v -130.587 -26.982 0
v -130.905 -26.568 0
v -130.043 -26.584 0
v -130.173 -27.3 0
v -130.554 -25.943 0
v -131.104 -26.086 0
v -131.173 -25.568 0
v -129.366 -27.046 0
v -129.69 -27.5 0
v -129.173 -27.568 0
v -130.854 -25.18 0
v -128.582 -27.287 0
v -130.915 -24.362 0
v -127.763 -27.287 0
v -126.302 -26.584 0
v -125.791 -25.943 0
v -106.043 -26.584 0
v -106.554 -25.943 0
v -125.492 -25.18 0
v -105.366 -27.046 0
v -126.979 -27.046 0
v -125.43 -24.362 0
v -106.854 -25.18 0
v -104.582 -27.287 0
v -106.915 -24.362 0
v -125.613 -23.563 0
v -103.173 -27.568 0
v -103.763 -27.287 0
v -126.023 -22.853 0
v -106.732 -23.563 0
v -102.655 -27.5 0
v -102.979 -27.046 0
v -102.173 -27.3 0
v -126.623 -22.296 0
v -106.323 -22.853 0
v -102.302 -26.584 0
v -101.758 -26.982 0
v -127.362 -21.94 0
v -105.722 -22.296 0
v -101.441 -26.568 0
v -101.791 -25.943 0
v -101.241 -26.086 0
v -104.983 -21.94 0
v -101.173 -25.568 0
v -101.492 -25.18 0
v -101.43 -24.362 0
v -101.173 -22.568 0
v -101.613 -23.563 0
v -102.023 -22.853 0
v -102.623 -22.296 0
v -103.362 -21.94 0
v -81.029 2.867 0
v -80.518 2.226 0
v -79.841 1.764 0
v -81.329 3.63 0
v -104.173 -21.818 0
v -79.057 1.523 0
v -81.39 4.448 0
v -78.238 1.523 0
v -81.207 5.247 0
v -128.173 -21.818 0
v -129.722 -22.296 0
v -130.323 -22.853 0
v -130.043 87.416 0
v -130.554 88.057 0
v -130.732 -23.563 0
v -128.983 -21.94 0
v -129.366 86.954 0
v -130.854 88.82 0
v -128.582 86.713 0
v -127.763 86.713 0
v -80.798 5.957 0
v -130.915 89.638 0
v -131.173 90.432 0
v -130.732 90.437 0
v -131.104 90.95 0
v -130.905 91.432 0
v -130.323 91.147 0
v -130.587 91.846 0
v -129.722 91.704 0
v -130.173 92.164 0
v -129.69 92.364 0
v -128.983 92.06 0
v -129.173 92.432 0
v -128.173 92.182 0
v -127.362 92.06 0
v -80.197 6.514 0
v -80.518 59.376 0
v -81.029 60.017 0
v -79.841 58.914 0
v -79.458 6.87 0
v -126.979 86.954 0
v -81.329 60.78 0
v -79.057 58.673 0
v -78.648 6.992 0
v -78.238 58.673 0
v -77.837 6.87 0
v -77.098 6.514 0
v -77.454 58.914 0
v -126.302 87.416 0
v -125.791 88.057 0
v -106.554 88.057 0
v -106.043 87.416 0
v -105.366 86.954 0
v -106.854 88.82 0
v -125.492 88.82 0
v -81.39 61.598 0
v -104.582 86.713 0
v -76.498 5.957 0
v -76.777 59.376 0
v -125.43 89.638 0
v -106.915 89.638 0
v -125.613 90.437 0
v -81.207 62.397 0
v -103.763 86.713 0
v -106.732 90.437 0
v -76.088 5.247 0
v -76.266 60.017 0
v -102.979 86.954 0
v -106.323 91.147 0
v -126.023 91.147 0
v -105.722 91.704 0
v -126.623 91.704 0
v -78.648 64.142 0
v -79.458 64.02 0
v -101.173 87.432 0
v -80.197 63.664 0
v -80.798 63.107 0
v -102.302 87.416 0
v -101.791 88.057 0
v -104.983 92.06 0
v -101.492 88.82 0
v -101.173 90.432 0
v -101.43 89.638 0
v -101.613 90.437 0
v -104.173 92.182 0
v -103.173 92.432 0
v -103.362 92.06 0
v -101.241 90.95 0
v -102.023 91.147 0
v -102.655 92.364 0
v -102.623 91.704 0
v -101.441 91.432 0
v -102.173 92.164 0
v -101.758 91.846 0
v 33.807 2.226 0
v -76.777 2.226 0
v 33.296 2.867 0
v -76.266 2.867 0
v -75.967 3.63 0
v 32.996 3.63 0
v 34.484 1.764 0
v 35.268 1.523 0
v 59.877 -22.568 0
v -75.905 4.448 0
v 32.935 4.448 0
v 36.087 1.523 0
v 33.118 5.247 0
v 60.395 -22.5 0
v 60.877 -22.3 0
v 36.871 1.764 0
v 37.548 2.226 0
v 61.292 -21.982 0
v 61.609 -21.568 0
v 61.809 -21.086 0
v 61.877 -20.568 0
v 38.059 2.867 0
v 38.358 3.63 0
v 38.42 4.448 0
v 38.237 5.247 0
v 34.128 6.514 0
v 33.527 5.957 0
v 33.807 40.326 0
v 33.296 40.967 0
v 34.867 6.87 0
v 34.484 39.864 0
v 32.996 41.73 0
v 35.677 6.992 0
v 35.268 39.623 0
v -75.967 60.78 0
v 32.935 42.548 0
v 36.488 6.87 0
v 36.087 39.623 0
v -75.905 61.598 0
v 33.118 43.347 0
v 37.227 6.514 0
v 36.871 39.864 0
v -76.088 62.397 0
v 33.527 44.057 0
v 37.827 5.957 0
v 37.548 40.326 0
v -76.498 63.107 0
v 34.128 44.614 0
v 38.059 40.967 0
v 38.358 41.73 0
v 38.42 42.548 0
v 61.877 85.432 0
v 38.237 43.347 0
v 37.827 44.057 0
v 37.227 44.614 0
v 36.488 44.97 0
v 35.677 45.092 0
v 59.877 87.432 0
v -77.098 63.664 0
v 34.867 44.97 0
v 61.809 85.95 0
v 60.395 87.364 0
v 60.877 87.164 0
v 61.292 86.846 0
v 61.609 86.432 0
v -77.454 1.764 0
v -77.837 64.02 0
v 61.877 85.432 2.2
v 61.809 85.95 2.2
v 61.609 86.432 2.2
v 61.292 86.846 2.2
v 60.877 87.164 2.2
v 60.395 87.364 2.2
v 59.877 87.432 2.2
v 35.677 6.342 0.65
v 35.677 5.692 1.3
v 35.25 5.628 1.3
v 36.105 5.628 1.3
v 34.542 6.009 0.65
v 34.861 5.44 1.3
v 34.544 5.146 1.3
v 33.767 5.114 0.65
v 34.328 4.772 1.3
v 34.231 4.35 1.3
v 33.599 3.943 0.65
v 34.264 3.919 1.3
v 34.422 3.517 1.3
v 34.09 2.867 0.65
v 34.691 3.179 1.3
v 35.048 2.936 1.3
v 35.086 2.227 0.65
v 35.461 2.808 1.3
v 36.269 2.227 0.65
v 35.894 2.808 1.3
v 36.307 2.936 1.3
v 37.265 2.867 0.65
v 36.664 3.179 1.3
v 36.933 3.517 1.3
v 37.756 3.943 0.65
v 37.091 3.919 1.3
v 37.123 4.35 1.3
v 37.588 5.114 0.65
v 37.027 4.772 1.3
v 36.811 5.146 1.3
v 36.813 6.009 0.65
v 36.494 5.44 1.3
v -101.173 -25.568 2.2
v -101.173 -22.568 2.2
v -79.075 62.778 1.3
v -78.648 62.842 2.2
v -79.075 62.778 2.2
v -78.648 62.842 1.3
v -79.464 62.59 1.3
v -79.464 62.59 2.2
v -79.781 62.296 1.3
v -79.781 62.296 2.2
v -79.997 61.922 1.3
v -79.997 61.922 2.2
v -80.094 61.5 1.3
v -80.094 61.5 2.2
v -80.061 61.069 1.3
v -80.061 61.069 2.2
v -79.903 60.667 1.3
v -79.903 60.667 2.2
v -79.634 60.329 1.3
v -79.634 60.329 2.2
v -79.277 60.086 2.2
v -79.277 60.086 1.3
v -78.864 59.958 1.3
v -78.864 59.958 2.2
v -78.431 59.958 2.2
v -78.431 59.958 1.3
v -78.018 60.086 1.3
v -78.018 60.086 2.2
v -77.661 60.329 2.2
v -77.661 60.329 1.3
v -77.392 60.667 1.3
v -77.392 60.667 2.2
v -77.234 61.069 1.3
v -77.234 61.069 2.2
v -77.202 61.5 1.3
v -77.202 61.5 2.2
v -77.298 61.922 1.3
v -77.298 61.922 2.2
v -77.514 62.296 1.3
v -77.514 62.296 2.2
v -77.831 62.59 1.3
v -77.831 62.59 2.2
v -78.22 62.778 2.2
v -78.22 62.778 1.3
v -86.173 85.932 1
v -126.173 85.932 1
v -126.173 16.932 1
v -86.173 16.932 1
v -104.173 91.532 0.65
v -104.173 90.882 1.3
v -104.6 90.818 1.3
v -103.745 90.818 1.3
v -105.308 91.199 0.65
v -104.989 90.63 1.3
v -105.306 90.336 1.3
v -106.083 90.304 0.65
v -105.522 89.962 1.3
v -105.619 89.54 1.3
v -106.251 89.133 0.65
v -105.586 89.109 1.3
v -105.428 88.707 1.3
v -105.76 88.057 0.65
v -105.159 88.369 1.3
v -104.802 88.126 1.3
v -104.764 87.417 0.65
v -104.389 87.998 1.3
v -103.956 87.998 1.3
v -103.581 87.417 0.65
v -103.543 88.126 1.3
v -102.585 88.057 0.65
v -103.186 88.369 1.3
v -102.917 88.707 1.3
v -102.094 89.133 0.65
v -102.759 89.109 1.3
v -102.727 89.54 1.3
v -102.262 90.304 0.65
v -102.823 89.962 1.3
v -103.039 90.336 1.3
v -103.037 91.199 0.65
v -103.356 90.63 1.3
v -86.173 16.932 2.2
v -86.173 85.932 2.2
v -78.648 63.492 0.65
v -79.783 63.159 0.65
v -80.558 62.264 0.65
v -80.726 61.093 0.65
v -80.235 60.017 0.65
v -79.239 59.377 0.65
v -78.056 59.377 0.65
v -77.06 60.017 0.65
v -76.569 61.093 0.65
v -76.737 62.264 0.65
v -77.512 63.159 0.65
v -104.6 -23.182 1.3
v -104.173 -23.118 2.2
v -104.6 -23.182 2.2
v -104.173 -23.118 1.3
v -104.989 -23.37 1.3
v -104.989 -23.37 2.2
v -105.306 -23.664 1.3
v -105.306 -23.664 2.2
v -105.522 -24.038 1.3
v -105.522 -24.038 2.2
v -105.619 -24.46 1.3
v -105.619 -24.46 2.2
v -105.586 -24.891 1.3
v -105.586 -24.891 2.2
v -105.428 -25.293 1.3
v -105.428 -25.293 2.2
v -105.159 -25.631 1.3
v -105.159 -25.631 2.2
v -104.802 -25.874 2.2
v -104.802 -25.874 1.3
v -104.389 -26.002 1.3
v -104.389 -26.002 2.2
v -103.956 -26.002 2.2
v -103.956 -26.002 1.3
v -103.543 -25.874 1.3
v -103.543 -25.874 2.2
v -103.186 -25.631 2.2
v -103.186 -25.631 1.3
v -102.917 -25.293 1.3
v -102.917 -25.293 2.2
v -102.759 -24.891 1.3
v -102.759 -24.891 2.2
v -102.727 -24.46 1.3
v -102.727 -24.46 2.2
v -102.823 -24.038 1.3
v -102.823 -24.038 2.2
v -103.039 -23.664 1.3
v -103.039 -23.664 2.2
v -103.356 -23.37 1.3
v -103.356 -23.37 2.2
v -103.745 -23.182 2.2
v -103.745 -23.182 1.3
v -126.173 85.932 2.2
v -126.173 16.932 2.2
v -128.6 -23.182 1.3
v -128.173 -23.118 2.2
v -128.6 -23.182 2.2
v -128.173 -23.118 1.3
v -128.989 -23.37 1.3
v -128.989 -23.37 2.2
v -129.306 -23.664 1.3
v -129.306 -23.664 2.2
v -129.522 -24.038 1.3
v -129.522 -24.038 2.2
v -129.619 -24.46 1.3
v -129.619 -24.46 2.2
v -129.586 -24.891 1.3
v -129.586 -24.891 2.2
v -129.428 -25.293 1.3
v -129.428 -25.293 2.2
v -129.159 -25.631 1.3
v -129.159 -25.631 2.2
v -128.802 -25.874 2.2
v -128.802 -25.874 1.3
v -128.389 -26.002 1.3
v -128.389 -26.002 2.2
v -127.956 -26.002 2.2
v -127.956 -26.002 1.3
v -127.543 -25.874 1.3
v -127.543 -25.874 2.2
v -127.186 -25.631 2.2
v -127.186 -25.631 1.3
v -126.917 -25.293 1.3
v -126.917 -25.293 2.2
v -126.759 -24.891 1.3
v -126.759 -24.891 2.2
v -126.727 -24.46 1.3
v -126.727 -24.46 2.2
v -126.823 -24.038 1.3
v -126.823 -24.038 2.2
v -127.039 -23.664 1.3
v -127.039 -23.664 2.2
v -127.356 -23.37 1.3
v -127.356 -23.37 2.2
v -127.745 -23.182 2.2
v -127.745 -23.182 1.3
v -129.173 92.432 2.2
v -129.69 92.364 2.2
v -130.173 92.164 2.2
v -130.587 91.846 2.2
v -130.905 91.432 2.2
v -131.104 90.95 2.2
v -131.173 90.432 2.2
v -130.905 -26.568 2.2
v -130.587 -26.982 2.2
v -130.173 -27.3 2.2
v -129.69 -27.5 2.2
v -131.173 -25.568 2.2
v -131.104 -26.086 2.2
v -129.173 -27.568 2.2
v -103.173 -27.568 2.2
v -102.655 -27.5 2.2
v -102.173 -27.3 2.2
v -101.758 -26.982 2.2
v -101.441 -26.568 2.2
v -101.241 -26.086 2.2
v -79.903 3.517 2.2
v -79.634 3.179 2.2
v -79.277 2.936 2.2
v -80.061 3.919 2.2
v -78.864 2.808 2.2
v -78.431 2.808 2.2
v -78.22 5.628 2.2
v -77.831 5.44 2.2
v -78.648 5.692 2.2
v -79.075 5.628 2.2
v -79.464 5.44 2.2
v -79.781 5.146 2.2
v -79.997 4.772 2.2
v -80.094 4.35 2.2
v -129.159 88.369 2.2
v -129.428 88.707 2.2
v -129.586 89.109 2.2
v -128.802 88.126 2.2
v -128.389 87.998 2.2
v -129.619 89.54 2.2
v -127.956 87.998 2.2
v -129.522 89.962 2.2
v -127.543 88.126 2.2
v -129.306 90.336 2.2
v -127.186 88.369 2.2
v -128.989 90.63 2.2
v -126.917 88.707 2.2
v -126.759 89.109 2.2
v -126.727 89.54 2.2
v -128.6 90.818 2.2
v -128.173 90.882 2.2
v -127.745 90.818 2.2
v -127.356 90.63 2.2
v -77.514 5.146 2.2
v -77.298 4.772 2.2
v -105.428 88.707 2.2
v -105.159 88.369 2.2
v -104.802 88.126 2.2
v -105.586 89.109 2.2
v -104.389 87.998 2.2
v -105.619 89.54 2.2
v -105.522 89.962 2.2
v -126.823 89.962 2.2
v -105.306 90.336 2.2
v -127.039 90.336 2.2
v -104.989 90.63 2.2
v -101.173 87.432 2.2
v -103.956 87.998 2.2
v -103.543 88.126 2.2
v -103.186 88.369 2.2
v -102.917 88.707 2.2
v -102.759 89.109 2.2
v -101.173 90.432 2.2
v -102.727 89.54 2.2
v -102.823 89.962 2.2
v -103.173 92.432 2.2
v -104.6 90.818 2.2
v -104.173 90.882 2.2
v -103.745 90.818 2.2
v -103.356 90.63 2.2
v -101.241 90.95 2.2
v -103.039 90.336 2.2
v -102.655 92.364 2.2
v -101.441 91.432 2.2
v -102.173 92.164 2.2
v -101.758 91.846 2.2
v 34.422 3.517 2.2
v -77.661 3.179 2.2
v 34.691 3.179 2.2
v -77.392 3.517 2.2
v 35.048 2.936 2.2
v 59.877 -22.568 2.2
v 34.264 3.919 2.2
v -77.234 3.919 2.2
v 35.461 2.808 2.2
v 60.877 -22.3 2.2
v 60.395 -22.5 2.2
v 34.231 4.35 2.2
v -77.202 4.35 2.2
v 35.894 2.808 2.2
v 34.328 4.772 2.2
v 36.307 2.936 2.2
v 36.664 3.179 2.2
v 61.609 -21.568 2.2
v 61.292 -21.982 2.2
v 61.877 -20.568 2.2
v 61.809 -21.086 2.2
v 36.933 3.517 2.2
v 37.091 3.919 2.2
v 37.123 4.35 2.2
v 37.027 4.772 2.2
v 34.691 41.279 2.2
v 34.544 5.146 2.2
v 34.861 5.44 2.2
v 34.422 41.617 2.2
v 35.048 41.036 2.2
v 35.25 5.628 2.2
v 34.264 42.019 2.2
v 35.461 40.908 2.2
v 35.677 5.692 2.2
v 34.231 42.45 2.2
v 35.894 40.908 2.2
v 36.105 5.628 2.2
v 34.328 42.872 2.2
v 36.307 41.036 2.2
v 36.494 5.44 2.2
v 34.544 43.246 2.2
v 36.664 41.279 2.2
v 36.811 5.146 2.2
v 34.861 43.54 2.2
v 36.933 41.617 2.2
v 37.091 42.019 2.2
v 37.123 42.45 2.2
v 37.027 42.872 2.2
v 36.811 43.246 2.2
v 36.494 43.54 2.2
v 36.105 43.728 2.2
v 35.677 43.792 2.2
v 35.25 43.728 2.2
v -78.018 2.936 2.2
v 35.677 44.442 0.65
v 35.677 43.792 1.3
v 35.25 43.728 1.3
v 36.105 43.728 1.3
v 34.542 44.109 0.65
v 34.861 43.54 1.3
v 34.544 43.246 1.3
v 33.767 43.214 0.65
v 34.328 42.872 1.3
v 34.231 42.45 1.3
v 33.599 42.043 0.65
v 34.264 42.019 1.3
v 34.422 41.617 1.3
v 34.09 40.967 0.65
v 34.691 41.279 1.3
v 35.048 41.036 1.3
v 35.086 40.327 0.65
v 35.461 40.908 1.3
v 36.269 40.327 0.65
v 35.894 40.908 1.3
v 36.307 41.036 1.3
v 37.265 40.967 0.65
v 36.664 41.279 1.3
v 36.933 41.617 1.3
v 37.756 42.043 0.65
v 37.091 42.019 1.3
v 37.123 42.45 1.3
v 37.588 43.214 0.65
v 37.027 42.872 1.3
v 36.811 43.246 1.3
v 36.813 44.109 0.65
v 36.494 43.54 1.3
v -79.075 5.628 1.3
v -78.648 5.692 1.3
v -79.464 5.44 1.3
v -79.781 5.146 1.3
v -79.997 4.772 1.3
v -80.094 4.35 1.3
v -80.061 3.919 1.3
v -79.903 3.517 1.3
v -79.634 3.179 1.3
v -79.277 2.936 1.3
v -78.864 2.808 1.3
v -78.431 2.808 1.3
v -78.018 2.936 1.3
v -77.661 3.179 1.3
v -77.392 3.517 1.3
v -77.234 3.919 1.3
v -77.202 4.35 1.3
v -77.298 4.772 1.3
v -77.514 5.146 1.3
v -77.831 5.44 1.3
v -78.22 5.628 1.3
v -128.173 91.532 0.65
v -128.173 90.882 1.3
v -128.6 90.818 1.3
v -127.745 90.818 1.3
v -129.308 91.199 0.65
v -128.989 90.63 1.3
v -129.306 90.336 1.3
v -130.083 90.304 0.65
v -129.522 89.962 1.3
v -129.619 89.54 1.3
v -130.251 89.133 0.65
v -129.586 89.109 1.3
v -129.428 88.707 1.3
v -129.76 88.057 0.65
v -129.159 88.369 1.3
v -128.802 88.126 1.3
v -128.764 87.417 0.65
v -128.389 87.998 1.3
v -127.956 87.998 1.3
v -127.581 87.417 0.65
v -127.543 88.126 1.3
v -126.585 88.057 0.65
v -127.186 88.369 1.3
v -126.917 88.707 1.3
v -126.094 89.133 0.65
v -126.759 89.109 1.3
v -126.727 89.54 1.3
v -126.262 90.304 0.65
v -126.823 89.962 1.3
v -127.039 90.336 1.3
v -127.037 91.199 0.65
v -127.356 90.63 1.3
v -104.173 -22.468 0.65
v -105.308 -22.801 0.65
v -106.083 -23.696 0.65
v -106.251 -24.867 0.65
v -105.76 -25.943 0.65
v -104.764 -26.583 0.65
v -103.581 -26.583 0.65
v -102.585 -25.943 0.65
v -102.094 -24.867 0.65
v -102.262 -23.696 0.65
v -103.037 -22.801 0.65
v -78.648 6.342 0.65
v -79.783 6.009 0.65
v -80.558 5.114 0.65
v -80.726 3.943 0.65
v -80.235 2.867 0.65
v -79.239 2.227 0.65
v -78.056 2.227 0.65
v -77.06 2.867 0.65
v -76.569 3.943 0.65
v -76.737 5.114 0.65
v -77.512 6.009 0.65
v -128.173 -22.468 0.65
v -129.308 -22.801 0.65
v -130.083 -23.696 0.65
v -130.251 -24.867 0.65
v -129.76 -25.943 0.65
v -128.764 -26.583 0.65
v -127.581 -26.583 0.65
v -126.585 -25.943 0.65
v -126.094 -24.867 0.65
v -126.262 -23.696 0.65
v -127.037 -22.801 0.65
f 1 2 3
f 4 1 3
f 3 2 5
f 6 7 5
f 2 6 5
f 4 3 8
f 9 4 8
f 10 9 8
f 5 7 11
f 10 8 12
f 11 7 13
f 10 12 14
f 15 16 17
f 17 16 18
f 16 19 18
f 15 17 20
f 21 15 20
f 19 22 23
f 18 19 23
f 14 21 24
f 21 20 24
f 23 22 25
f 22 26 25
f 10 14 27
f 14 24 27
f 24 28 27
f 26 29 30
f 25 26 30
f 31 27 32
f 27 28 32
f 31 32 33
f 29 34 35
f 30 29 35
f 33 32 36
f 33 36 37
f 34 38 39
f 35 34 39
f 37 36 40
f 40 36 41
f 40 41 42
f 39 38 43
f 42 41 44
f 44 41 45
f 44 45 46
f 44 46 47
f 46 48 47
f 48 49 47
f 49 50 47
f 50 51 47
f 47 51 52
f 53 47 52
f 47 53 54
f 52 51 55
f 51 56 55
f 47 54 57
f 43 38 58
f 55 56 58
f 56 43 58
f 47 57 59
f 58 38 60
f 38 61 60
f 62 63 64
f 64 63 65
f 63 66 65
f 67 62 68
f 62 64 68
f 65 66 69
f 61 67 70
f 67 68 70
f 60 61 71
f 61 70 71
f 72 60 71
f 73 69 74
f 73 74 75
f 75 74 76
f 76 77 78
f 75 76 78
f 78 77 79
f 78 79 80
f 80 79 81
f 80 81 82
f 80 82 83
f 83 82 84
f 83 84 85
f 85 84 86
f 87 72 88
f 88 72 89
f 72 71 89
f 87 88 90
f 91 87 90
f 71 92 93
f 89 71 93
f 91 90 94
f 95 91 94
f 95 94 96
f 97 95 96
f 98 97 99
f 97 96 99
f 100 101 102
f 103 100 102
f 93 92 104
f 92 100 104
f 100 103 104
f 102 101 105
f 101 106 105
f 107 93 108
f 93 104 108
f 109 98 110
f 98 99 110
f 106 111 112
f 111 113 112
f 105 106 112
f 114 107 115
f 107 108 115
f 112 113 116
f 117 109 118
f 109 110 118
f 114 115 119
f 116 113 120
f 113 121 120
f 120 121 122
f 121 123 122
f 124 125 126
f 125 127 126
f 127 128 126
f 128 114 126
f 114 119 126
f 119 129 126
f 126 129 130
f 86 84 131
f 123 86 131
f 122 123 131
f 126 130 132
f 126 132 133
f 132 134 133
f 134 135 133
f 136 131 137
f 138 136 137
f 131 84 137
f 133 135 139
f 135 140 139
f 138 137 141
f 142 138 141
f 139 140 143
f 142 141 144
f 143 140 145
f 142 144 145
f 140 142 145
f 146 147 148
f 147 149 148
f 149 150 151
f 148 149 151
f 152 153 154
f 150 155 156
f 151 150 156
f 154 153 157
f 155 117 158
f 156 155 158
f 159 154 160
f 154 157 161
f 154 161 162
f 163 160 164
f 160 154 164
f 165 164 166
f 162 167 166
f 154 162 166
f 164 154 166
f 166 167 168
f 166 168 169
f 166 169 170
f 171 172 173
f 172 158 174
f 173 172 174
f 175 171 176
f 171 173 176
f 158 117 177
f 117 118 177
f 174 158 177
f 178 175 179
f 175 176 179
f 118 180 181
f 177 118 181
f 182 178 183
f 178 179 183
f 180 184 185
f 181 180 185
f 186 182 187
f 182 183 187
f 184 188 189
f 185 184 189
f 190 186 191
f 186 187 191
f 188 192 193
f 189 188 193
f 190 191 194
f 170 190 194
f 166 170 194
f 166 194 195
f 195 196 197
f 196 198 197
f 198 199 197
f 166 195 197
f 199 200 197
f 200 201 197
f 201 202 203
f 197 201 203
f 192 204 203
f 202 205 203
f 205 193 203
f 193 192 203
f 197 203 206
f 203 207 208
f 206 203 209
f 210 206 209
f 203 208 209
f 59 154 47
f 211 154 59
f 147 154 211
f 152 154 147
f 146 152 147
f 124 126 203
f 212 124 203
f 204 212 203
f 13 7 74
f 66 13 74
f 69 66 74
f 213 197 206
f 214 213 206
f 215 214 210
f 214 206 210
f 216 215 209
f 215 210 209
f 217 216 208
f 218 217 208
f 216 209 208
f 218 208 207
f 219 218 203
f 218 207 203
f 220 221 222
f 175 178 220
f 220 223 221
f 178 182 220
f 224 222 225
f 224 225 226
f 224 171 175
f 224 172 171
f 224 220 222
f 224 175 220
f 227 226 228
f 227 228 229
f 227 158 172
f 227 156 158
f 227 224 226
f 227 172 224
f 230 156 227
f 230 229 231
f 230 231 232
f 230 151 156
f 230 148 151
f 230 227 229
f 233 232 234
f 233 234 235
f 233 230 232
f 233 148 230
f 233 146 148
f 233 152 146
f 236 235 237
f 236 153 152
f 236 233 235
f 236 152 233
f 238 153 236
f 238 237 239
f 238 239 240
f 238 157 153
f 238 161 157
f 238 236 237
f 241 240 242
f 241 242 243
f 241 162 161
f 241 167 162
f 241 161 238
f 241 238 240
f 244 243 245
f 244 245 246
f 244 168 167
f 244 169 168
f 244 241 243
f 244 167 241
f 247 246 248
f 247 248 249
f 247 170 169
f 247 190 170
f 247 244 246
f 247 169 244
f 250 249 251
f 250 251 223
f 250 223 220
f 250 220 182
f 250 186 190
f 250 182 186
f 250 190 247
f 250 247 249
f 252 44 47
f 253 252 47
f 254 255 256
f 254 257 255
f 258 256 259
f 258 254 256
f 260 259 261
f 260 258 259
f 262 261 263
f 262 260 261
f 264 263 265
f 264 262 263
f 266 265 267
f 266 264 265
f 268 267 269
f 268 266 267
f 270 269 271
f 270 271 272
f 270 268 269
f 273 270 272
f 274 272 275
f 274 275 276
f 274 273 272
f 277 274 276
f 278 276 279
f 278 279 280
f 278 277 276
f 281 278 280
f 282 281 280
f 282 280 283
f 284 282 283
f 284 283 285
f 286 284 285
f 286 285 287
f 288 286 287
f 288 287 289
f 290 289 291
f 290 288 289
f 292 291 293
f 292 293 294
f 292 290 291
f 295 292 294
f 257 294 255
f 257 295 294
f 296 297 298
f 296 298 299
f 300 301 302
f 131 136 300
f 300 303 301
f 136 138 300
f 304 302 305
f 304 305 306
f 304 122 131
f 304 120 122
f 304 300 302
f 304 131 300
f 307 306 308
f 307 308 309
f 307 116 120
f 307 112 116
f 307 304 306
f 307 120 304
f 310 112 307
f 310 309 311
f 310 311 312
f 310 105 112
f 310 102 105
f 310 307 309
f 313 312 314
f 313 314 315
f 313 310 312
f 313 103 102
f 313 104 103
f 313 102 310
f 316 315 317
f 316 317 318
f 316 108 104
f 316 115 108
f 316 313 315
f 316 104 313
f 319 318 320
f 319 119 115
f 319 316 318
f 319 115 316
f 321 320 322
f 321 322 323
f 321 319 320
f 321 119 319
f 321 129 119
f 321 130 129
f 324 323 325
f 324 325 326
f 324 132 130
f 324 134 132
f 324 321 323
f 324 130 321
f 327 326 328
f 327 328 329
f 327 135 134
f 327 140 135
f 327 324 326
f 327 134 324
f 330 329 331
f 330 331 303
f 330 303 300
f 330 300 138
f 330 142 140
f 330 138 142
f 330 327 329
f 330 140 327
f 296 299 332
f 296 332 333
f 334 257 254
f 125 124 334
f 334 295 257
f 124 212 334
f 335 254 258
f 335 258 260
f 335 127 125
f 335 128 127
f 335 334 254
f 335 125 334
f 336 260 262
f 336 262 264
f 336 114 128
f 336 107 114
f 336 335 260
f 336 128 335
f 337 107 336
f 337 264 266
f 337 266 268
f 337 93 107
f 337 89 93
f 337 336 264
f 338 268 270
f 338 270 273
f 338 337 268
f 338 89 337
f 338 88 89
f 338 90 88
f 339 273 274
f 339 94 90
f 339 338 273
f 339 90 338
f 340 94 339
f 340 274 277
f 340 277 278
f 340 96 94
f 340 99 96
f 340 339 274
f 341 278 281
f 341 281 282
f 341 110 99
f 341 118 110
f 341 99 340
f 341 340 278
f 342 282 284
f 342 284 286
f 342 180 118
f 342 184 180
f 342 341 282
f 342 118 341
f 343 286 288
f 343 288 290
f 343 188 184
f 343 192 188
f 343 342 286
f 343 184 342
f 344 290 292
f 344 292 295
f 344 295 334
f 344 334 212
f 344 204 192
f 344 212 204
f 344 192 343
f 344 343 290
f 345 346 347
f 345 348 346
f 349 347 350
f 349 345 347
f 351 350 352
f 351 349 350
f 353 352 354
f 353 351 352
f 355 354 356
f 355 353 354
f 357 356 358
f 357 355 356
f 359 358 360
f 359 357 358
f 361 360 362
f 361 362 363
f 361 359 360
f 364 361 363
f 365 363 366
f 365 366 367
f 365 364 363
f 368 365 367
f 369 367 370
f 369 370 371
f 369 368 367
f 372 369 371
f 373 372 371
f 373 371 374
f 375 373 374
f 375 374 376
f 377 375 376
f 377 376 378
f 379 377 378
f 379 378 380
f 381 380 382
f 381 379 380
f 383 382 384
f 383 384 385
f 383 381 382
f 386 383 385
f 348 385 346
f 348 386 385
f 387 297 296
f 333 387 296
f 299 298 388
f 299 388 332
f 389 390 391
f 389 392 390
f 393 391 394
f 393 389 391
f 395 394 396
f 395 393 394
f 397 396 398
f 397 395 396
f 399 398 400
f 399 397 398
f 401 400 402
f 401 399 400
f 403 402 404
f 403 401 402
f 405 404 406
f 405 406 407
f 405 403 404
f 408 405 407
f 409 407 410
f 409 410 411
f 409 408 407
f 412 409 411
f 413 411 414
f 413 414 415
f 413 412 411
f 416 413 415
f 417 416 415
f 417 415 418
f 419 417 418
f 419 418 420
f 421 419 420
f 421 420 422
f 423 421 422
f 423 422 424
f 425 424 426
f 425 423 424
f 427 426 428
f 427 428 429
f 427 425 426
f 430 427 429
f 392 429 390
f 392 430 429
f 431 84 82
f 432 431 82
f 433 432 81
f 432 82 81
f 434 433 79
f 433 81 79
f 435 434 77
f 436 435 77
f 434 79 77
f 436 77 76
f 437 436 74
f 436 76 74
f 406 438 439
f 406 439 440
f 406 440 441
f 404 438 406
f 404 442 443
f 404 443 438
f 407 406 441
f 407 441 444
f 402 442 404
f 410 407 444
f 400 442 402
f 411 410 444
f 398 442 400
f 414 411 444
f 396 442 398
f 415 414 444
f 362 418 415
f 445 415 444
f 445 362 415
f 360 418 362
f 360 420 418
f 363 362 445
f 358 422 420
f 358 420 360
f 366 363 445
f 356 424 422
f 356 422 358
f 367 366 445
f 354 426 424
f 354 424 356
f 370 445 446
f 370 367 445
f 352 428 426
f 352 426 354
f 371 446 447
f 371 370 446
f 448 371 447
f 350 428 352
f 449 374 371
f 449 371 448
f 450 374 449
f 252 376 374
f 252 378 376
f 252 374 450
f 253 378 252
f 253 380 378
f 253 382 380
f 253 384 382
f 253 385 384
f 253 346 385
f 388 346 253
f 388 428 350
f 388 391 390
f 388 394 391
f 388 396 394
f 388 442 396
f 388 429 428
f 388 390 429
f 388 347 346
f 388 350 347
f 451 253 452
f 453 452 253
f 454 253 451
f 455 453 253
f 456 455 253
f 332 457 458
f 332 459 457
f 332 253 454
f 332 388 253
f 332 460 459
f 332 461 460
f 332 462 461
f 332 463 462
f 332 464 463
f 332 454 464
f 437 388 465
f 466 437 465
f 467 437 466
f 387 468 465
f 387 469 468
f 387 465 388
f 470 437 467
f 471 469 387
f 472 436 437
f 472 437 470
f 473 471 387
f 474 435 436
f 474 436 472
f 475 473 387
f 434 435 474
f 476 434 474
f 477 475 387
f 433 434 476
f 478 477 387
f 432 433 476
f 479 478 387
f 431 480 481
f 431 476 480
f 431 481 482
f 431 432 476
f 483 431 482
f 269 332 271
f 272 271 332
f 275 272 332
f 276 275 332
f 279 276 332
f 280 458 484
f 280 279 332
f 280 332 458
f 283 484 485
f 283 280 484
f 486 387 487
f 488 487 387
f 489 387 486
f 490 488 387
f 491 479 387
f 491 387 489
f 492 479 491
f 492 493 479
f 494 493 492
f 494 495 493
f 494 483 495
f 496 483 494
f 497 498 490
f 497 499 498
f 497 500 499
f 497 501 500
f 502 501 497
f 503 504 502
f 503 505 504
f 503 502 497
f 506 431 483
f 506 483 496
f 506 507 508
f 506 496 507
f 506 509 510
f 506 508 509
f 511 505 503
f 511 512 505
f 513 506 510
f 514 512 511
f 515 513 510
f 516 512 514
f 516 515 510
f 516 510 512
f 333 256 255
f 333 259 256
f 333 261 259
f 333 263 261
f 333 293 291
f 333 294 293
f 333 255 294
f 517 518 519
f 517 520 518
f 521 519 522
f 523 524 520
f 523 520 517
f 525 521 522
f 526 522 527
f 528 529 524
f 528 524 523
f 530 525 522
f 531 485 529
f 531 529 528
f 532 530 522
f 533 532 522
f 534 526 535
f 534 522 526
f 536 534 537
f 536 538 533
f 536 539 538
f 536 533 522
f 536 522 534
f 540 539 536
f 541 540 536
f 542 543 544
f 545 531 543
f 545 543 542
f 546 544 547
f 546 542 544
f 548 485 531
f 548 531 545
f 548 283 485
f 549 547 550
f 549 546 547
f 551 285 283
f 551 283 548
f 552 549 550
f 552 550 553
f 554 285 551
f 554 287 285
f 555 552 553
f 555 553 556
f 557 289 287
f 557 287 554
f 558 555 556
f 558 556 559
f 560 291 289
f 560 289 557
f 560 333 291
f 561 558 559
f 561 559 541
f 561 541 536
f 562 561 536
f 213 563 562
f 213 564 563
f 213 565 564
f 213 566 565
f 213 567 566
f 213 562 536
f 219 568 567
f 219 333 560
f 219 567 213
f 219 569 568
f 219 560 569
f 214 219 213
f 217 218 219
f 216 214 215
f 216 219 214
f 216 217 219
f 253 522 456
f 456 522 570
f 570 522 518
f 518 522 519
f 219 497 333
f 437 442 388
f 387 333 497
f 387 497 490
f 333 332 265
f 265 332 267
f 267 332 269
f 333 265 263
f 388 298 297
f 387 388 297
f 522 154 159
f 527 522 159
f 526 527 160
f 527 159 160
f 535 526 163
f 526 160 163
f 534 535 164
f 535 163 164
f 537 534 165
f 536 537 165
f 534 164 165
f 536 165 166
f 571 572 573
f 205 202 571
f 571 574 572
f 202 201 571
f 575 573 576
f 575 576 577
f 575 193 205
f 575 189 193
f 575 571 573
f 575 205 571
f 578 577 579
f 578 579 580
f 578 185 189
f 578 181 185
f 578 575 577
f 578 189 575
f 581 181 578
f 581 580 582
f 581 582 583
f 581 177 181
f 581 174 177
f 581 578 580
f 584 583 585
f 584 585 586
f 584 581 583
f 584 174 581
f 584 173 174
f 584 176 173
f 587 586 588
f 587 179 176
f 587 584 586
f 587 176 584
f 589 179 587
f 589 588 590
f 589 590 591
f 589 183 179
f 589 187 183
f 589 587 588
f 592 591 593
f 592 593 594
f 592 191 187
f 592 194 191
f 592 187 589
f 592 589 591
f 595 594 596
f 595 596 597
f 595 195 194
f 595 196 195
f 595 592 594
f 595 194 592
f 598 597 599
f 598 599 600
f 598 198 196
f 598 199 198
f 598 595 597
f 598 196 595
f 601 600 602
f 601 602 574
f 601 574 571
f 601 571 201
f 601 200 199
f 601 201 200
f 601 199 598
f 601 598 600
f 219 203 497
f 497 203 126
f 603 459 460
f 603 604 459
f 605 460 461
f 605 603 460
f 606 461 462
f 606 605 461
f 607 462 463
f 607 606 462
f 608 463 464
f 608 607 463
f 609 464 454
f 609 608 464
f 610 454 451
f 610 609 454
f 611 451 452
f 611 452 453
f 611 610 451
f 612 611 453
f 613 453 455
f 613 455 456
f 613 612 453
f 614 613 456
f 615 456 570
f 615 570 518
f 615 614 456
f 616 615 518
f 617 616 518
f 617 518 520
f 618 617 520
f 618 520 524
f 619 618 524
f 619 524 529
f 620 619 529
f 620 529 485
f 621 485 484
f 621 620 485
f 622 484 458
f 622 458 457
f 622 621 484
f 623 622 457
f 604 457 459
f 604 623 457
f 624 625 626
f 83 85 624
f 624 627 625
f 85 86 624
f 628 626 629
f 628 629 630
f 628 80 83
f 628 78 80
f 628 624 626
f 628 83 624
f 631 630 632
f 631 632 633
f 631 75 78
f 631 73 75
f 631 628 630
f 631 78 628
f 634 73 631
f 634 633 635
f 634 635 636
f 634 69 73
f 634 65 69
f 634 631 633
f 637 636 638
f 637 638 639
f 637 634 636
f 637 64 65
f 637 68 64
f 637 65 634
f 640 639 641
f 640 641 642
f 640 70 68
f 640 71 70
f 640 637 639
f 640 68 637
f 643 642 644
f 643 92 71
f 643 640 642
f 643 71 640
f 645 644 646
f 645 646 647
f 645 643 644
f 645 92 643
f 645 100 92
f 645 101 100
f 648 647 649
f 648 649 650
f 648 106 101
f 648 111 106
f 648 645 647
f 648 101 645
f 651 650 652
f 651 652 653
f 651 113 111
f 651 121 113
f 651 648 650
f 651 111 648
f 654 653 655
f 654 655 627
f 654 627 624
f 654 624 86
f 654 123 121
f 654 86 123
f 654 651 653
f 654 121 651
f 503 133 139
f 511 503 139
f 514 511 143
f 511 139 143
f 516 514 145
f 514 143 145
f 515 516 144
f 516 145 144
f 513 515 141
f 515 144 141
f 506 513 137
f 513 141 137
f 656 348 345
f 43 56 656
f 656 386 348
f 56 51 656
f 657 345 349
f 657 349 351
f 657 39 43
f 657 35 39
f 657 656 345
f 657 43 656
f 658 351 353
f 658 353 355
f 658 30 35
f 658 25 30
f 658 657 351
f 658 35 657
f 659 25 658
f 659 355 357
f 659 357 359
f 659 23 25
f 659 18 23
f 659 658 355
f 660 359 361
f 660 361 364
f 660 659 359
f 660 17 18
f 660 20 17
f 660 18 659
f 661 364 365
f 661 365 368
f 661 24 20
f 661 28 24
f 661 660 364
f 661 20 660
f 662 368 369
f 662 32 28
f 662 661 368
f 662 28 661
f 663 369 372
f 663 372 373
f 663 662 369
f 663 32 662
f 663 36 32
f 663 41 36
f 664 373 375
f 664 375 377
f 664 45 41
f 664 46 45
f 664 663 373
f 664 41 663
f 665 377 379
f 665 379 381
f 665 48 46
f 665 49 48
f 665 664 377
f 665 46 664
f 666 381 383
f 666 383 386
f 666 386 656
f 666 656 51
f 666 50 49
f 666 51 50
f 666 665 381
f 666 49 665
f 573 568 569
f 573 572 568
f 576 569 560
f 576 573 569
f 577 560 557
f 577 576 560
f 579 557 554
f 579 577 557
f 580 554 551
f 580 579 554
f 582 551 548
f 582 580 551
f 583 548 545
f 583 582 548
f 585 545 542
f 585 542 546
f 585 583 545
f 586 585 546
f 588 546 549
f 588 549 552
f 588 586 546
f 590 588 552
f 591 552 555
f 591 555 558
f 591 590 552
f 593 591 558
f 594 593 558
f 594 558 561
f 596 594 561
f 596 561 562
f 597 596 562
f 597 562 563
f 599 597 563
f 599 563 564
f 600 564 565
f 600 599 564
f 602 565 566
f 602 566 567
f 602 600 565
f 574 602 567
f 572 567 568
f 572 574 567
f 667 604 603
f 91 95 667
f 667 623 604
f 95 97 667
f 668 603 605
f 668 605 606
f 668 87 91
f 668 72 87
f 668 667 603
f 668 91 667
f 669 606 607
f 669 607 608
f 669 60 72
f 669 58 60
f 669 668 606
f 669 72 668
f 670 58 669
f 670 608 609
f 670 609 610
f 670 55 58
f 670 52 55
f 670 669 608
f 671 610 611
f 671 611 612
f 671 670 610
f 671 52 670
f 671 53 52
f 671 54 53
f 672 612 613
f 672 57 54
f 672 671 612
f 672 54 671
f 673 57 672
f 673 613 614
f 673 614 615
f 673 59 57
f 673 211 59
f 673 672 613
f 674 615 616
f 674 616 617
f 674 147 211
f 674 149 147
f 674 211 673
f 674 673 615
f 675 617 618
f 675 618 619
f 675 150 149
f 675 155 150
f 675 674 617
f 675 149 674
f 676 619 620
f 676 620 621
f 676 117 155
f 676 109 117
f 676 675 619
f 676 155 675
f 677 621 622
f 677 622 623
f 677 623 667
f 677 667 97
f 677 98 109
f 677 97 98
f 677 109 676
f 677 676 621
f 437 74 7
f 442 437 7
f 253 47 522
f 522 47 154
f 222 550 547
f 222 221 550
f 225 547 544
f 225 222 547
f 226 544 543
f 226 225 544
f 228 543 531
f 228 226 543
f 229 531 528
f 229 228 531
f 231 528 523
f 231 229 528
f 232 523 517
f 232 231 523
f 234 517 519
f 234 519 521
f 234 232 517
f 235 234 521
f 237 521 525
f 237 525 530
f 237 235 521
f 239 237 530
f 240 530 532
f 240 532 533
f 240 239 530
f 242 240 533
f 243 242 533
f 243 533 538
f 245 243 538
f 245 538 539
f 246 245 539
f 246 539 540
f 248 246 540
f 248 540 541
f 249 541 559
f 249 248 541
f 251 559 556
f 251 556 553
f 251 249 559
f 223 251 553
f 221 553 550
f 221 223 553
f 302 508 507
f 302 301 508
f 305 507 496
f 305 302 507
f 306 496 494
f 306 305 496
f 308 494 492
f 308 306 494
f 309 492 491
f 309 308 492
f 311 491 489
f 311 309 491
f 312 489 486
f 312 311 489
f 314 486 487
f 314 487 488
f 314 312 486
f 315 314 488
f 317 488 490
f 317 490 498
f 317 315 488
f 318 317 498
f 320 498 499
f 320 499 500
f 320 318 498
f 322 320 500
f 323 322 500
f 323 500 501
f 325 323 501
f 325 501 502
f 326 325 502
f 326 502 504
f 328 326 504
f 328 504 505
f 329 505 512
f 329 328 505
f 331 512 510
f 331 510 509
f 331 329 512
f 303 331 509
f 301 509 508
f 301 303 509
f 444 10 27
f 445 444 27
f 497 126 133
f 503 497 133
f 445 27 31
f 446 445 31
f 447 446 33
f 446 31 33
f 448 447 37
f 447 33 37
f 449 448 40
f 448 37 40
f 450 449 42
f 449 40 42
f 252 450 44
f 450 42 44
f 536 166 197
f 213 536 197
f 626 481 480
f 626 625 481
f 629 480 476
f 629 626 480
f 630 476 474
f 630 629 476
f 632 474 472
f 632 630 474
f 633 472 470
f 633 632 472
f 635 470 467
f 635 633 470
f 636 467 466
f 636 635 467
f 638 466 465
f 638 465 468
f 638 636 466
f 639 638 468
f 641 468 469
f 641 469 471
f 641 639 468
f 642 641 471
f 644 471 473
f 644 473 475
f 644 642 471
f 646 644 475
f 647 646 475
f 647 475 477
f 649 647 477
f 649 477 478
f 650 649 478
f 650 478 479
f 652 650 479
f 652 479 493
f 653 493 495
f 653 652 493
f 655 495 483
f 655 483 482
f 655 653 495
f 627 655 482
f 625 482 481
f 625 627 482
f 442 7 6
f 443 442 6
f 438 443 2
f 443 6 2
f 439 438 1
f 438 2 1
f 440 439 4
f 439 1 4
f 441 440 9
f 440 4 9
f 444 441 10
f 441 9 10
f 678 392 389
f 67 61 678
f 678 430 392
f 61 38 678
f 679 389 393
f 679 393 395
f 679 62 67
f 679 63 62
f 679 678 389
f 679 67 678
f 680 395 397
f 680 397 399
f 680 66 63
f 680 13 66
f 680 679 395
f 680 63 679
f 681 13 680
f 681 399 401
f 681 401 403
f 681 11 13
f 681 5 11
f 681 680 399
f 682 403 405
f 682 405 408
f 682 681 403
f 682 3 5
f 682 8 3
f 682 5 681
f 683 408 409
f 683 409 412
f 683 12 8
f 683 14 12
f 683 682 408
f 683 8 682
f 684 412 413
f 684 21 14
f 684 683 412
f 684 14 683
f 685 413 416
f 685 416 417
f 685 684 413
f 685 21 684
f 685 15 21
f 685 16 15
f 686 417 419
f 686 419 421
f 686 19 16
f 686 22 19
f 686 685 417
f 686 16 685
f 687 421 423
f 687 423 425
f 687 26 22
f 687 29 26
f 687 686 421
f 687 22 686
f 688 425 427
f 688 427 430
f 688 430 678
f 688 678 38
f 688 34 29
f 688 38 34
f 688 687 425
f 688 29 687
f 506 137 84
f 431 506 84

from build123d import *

# Parameters (mm, degrees)
BOSS_EXTRUDE1_DEPTH                            = 2.2
CSK_FOR_M2_5_COUNTERSUNK_FLAT_HEAD_S_2_COUNT   = 2
CSK_FOR_M2_5_COUNTERSUNK_FLAT_HEAD_S_2_PITCH   = 115.901286123
CSK_FOR_M2_5_COUNTERSUNK_FLAT_HEAD_S_3_COUNT   = 2
CSK_FOR_M2_5_COUNTERSUNK_FLAT_HEAD_S_3_PITCH   = 127.813646083
CSK_FOR_M2_5_COUNTERSUNK_FLAT_HEAD_S_4_COUNT   = 2
CSK_FOR_M2_5_COUNTERSUNK_FLAT_HEAD_S_4_PITCH   = 57.15
CSK_FOR_M2_5_COUNTERSUNK_FLAT_HEAD_S_5_A_COUNT = 2
CSK_FOR_M2_5_COUNTERSUNK_FLAT_HEAD_S_5_A_PITCH = 24
CSK_FOR_M2_5_COUNTERSUNK_FLAT_HEAD_S_6_COUNT   = 2
CSK_FOR_M2_5_COUNTERSUNK_FLAT_HEAD_S_6_PITCH   = 114
CSK_FOR_M2_5_COUNTERSUNK_FLAT_HEAD_S_7_COUNT   = 2
CSK_FOR_M2_5_COUNTERSUNK_FLAT_HEAD_S_7_PITCH   = 116.498927034
CUT_EXTRUDE1_DEPTH                             = 161.482952565
CUT_EXTRUDE1_DEPTH_BACK                        = 1.2
SKETCH4_W                                      = 40
SKETCH4_H                                      = 69


with BuildPart() as part:
    # Sketch1 → Boss-Extrude1 (new body)
    with BuildSketch(Plane.XY):
        with BuildLine():
            Line((-129.172572744, -27.567893977), (-103.172572744, -27.567893977))
            ThreePointArc((-103.172572744, -27.567893977), (-101.758359182, -26.98210754), (-101.172572744, -25.567893977))
            Line((-101.172572744, -25.567893977), (-101.172572744, -22.567893977))
            Line((-101.172572744, -22.567893977), (59.877427256, -22.567893977))
            ThreePointArc((59.877427256, -22.567893977), (61.291640818, -21.98210754), (61.877427256, -20.567893977))
            Line((61.877427256, -20.567893977), (61.877427256, 85.432106023))
            ThreePointArc((61.877427256, 85.432106023), (61.291640818, 86.846319585), (59.877427256, 87.432106023))
            Line((59.877427256, 87.432106023), (-101.172572744, 87.432106023))
            Line((-101.172572744, 87.432106023), (-101.172572744, 90.432106023))
            ThreePointArc((-101.172572744, 90.432106023), (-101.758359182, 91.846319585), (-103.172572744, 92.432106023))
            Line((-103.172572744, 92.432106023), (-129.172572744, 92.432106023))
            ThreePointArc((-129.172572744, 92.432106023), (-130.586786306, 91.846319585), (-131.172572744, 90.432106023))
            Line((-131.172572744, 90.432106023), (-131.172572744, -25.567893977))
            ThreePointArc((-131.172572744, -25.567893977), (-130.586786306, -26.98210754), (-129.172572744, -27.567893977))
        make_face()
    extrude(amount=BOSS_EXTRUDE1_DEPTH)

    # Sketch2 → CSK for M2.5 Countersunk Flat Head Screw (revolve, cut)
    with BuildSketch(Plane(origin=(-78.647572744, 61.391992259, 0), x_dir=(0, 1, 0), z_dir=(1, 0, 0))):
        Polygon((0, 0), (0, 2.2), (1.45, 2.2), (1.45, 1.3), (2.75, 0), align=None)
    csk_for_m2_5_countersunk_flat_head_screw = revolve(axis=Axis((-78.647572744, 61.391992259, -6.35), (0, 0, 1)), mode=Mode.SUBTRACT)

    # CSK for M2.5 Countersunk Flat Head S 2: CSK for M2.5 Countersunk Flat Head Screw ×2
    with Locations(*[Vector(0.9863997529632768, -0.1643640086940774, 0) * (i * CSK_FOR_M2_5_COUNTERSUNK_FLAT_HEAD_S_2_PITCH) for i in range(1, CSK_FOR_M2_5_COUNTERSUNK_FLAT_HEAD_S_2_COUNT)]):
        add(csk_for_m2_5_countersunk_flat_head_screw, mode=Mode.SUBTRACT)

    # CSK for M2.5 Countersunk Flat Head S 3: CSK for M2.5 Countersunk Flat Head Screw ×2
    with Locations(*[Vector(0.8944663070316109, -0.447135354881754, 0) * (i * CSK_FOR_M2_5_COUNTERSUNK_FLAT_HEAD_S_3_PITCH) for i in range(1, CSK_FOR_M2_5_COUNTERSUNK_FLAT_HEAD_S_3_COUNT)]):
        add(csk_for_m2_5_countersunk_flat_head_screw, mode=Mode.SUBTRACT)

    # CSK for M2.5 Countersunk Flat Head S 4: CSK for M2.5 Countersunk Flat Head Screw ×2
    with Locations(*[(0, -i * CSK_FOR_M2_5_COUNTERSUNK_FLAT_HEAD_S_4_PITCH, 0) for i in range(1, CSK_FOR_M2_5_COUNTERSUNK_FLAT_HEAD_S_4_COUNT)]):
        add(csk_for_m2_5_countersunk_flat_head_screw, mode=Mode.SUBTRACT)

    # Sketch3 → CSK for M2.5 Countersunk Flat Head S 5 (revolve, cut)
    with BuildSketch(Plane(origin=(-104.172572744, 89.432106023, 0), x_dir=(0, 1, 0), z_dir=(1, 0, 0))):
        Polygon((0, 0), (0, 2.2), (1.45, 2.2), (1.45, 1.3), (2.75, 0), align=None)
    csk_for_m2_5_countersunk_flat_head_s_5 = revolve(axis=Axis((-104.172572744, 89.432106023, -6.35), (0, 0, 1)), mode=Mode.SUBTRACT)

    # CSK for M2.5 Countersunk Flat Head S 5 a: CSK for M2.5 Countersunk Flat Head S 5 ×2
    with Locations(*[(-i * CSK_FOR_M2_5_COUNTERSUNK_FLAT_HEAD_S_5_A_PITCH, 0, 0) for i in range(1, CSK_FOR_M2_5_COUNTERSUNK_FLAT_HEAD_S_5_A_COUNT)]):
        add(csk_for_m2_5_countersunk_flat_head_s_5, mode=Mode.SUBTRACT)

    # CSK for M2.5 Countersunk Flat Head S 6: CSK for M2.5 Countersunk Flat Head S 5 ×2
    with Locations(*[(0, -i * CSK_FOR_M2_5_COUNTERSUNK_FLAT_HEAD_S_6_PITCH, 0) for i in range(1, CSK_FOR_M2_5_COUNTERSUNK_FLAT_HEAD_S_6_COUNT)]):
        add(csk_for_m2_5_countersunk_flat_head_s_5, mode=Mode.SUBTRACT)

    # CSK for M2.5 Countersunk Flat Head S 7: CSK for M2.5 Countersunk Flat Head S 5 ×2
    with Locations(*[Vector(-0.20601048104984218, -0.9785497849867489, 0) * (i * CSK_FOR_M2_5_COUNTERSUNK_FLAT_HEAD_S_7_PITCH) for i in range(1, CSK_FOR_M2_5_COUNTERSUNK_FLAT_HEAD_S_7_COUNT)]):
        add(csk_for_m2_5_countersunk_flat_head_s_5, mode=Mode.SUBTRACT)

    # Sketch4 → Cut-Extrude1 (cut, two sides: drawn at the far end of the back side and taken through both)
    with BuildSketch(Plane.XY.offset(2.2).offset(-CUT_EXTRUDE1_DEPTH_BACK)):
        with Locations((-106.172572744, 51.432106023)):
            Rectangle(SKETCH4_W, SKETCH4_H)
    extrude(amount=CUT_EXTRUDE1_DEPTH + CUT_EXTRUDE1_DEPTH_BACK, mode=Mode.SUBTRACT)


solid = part.part
